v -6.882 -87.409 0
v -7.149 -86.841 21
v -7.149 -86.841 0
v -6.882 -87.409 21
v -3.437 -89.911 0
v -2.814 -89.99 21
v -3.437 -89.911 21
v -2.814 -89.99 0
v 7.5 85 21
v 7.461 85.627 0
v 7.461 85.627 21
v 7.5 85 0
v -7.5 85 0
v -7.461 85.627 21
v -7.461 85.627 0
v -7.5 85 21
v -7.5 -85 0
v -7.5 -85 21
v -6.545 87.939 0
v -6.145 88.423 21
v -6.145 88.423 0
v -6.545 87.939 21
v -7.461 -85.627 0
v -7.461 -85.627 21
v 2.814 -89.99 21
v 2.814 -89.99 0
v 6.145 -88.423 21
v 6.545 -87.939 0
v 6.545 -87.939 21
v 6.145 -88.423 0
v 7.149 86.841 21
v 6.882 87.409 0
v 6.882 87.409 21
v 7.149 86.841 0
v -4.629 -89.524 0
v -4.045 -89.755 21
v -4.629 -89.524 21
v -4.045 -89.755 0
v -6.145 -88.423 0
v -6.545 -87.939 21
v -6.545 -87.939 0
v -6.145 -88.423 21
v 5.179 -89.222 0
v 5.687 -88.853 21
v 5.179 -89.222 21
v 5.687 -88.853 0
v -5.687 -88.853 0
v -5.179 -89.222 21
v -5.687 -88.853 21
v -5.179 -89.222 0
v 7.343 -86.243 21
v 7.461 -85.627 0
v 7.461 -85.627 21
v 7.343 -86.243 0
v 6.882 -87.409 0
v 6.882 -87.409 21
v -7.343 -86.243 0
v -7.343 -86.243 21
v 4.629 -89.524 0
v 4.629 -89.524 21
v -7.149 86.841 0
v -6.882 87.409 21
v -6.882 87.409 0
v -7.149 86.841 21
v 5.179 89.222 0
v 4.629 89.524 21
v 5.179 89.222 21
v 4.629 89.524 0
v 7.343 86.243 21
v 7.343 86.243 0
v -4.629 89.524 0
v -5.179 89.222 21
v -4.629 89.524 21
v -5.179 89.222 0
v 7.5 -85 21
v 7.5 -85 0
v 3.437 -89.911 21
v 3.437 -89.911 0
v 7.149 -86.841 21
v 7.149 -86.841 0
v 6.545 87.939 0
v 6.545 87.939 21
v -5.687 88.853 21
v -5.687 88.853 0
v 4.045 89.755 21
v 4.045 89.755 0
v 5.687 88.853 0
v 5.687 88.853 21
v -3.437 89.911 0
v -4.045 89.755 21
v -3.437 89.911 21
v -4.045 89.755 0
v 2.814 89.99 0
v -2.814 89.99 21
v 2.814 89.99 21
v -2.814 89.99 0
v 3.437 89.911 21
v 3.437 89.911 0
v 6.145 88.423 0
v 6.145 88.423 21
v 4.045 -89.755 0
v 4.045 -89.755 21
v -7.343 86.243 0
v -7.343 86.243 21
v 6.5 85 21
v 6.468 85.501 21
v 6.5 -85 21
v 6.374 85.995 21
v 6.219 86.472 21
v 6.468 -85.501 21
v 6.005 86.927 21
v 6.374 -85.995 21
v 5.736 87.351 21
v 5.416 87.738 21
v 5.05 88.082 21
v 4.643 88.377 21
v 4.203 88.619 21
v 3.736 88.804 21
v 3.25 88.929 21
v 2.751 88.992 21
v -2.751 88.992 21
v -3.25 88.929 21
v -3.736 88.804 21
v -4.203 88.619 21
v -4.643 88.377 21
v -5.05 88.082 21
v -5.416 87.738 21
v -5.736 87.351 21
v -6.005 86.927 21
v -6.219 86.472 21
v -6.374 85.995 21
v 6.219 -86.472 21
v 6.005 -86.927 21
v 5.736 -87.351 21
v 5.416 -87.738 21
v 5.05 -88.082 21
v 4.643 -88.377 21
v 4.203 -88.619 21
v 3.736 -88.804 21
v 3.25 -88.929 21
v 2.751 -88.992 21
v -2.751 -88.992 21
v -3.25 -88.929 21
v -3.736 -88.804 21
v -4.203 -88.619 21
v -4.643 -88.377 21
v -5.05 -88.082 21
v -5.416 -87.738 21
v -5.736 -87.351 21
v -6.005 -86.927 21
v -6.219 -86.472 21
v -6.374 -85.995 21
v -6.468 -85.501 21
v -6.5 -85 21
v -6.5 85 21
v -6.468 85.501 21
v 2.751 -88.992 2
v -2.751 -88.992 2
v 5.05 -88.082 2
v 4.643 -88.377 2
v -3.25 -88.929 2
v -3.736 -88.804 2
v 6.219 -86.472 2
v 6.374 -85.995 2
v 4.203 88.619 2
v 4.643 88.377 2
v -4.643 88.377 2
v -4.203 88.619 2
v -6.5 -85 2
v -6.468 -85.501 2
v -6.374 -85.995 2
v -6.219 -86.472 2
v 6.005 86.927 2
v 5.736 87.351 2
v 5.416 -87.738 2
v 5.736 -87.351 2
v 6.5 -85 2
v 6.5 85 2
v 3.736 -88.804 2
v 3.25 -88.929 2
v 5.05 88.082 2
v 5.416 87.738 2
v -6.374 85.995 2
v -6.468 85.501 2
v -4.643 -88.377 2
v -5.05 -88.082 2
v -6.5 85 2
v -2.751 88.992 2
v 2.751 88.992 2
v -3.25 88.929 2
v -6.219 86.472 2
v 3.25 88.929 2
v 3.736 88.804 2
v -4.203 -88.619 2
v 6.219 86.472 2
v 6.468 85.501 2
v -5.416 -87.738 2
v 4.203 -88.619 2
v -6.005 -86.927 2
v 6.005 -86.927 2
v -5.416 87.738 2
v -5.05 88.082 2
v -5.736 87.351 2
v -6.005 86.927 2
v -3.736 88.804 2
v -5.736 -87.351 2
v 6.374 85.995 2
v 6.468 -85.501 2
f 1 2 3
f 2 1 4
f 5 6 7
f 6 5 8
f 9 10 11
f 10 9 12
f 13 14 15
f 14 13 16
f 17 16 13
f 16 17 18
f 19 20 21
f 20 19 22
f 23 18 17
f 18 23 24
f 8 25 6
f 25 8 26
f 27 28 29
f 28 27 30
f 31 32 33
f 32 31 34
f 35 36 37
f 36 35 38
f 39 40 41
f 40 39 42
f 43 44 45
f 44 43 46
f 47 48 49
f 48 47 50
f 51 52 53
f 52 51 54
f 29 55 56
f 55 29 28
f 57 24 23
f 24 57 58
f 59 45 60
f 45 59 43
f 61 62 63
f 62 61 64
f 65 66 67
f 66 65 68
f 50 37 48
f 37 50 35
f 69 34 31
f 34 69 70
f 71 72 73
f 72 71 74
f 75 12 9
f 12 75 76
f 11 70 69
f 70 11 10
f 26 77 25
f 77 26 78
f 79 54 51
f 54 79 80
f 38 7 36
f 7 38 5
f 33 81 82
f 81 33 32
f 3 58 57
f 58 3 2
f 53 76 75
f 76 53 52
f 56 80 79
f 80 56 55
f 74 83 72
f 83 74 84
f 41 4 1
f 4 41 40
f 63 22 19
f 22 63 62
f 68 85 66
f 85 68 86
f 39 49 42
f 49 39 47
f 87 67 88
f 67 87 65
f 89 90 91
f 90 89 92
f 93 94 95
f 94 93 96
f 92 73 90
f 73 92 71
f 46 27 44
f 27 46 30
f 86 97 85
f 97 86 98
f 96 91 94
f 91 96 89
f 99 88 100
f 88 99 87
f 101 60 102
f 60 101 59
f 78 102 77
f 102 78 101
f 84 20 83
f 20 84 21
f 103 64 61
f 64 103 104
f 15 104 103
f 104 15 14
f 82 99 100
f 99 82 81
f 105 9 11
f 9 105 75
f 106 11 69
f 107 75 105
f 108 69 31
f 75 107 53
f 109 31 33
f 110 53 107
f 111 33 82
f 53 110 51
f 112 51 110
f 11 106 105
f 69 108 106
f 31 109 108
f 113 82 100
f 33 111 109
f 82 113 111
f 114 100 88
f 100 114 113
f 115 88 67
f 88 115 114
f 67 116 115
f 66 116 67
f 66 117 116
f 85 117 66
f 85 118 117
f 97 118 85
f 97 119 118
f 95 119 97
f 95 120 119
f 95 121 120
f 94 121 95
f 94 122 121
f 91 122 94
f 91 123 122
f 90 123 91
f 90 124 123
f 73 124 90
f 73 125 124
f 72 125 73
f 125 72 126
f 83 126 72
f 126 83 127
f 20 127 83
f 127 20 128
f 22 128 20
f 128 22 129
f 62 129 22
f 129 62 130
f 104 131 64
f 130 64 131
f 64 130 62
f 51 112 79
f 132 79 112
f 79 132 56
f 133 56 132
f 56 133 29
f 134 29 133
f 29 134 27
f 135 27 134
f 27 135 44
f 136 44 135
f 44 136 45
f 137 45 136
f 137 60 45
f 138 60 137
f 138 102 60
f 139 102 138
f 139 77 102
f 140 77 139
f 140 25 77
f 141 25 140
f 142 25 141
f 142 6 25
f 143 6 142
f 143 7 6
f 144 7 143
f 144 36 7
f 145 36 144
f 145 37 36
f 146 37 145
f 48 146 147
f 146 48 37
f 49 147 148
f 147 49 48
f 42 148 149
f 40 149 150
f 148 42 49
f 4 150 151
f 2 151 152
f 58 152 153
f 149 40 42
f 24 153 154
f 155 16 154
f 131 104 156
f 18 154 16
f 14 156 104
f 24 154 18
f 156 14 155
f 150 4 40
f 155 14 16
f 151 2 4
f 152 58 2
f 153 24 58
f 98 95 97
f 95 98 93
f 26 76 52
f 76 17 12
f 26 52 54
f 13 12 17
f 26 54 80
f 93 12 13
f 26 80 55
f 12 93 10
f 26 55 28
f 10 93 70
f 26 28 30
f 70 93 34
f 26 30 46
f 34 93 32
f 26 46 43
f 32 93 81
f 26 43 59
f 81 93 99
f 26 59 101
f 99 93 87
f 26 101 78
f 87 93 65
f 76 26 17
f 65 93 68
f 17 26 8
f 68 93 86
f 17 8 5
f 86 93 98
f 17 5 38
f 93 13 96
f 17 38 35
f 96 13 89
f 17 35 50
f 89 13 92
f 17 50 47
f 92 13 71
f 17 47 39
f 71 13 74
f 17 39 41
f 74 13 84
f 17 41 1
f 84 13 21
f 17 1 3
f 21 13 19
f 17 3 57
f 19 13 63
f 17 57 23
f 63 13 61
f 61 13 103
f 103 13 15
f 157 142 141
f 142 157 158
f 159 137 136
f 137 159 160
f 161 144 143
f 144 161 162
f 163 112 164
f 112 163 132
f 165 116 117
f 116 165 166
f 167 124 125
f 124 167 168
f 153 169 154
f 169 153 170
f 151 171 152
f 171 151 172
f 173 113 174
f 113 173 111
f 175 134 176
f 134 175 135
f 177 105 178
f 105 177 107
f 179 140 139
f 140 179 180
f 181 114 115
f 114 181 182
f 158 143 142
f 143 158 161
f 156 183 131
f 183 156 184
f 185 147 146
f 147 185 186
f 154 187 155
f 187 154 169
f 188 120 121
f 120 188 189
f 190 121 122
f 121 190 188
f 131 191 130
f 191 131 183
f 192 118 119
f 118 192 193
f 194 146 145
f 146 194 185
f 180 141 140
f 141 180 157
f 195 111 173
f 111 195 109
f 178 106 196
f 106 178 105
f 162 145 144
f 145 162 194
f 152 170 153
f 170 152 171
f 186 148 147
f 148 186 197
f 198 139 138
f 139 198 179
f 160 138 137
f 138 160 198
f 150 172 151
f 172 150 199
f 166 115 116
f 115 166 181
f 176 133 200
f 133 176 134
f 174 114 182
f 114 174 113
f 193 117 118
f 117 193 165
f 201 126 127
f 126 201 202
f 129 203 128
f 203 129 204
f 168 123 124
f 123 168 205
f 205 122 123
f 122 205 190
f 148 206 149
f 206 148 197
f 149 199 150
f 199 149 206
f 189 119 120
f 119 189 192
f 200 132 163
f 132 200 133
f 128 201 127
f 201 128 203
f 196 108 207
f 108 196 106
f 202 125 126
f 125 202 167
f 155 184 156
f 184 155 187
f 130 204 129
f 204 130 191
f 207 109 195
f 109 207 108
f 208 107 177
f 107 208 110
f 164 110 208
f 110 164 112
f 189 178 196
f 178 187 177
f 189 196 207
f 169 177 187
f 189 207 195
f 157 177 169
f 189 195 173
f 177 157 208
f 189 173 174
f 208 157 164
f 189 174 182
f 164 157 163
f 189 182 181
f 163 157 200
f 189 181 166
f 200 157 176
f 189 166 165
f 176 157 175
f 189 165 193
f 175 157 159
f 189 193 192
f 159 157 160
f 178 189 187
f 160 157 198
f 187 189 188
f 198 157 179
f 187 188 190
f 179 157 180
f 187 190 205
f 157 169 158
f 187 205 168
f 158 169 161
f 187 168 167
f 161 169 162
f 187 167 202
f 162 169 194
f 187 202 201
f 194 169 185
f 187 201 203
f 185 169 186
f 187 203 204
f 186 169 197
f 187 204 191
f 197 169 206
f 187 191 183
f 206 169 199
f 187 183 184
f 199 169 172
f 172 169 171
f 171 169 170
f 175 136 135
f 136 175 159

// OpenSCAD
$fn = 50;


difference() {
	union() {
		hull() {
			translate(v = [-2.5000000000, 85.0000000000, 0]) {
				cylinder(h = 21, r = 5);
			}
			translate(v = [2.5000000000, 85.0000000000, 0]) {
				cylinder(h = 21, r = 5);
			}
			translate(v = [-2.5000000000, -85.0000000000, 0]) {
				cylinder(h = 21, r = 5);
			}
			translate(v = [2.5000000000, -85.0000000000, 0]) {
				cylinder(h = 21, r = 5);
			}
		}
	}
	union() {
		translate(v = [0, 0, 2]) {
			hull() {
				translate(v = [-2.5000000000, 85.0000000000, 0]) {
					cylinder(h = 19, r = 4);
				}
				translate(v = [2.5000000000, 85.0000000000, 0]) {
					cylinder(h = 19, r = 4);
				}
				translate(v = [-2.5000000000, -85.0000000000, 0]) {
					cylinder(h = 19, r = 4);
				}
				translate(v = [2.5000000000, -85.0000000000, 0]) {
					cylinder(h = 19, r = 4);
				}
			}
		}
	}
}
